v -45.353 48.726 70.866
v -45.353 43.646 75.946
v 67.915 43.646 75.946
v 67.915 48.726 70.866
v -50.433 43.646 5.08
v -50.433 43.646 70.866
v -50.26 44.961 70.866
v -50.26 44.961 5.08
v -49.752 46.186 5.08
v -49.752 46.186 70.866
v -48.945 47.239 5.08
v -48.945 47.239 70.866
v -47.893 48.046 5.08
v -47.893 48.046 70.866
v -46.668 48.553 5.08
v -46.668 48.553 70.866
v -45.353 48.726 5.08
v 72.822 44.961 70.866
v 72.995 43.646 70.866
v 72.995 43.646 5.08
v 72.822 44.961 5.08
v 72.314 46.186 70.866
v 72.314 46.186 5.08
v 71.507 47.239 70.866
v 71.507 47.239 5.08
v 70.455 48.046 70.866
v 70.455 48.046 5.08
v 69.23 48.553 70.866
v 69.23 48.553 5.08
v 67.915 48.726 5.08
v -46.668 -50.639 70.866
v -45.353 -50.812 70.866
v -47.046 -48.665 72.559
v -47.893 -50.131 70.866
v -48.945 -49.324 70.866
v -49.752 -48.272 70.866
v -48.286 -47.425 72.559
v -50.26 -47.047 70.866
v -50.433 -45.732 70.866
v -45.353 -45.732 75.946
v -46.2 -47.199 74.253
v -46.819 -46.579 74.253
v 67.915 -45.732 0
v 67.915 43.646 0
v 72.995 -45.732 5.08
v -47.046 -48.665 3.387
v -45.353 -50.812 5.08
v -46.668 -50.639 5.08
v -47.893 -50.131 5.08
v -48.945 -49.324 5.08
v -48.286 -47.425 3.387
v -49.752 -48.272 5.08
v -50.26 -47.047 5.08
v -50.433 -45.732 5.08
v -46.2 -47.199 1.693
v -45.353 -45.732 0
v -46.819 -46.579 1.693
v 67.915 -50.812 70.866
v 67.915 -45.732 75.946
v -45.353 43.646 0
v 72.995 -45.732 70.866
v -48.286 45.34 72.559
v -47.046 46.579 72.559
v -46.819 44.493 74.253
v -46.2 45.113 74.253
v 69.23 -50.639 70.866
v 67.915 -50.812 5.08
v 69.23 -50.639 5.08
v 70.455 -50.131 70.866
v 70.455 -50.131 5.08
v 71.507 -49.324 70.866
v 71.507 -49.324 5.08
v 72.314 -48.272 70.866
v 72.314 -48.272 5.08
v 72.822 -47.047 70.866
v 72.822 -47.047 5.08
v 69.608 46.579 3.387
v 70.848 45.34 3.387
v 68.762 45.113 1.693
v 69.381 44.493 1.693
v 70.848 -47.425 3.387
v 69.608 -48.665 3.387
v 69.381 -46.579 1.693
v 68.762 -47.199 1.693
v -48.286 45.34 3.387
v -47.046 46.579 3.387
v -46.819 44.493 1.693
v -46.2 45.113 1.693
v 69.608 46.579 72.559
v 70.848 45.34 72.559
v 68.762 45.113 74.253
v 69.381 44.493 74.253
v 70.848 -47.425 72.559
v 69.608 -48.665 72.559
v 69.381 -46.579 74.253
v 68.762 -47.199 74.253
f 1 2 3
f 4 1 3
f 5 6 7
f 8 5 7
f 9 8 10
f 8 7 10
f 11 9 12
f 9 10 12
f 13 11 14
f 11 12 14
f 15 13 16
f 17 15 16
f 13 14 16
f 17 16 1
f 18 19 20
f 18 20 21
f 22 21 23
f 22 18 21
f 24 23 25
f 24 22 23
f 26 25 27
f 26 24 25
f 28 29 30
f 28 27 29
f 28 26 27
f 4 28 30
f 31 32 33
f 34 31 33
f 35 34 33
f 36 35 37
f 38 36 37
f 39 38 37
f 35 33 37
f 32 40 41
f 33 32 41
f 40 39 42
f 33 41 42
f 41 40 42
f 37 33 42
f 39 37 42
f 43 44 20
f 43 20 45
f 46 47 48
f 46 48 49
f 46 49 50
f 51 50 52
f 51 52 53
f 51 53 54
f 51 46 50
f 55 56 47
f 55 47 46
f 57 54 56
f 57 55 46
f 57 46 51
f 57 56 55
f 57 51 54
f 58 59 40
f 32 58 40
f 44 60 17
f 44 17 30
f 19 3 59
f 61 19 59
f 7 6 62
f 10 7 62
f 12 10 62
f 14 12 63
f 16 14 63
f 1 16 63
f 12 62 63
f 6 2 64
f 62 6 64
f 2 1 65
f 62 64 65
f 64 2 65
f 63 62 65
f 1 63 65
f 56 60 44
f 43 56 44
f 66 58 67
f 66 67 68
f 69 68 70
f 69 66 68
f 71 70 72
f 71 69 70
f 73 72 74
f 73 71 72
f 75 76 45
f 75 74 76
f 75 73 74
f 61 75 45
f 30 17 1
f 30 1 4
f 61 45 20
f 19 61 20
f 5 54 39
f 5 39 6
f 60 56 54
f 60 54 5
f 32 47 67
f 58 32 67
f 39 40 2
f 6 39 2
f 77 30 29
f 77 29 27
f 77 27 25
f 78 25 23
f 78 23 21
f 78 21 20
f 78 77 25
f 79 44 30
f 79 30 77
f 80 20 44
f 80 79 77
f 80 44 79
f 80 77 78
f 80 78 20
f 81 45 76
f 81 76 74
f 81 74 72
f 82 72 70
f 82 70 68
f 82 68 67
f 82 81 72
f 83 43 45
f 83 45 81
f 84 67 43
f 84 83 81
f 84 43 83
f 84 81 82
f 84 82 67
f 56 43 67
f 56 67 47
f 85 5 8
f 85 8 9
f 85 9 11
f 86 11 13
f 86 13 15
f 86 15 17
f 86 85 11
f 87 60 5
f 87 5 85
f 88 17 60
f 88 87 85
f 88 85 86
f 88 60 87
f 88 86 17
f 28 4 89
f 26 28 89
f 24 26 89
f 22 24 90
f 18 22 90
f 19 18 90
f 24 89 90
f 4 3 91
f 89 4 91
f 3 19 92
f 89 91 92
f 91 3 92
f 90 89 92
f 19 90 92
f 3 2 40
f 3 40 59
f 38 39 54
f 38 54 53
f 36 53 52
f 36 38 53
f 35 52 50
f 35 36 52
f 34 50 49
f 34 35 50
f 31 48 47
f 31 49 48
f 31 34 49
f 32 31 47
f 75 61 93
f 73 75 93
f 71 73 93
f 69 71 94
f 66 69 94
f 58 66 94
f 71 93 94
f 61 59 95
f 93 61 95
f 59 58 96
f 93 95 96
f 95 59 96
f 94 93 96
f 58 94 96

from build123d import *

# Parameters (mm, degrees)
F0_W     = 123.427745
F0_H     = 99.538509
F1_DEPTH = 75.946
F2_R     = 5.08
F3_SIZE  = 5.08


with BuildPart() as f1:
    # F0 (on Top) → F1 (new body)
    with BuildSketch(Plane.XY):
        with Locations((11.28103, -1.042786)):
            Rectangle(F0_W, F0_H)
    extrude(amount=F1_DEPTH)

    # F2
    f2_edges = [f1.edges().sort_by_distance(p)[0] for p in [
        (72.994903, 48.726469, 37.973),
        (-50.432842, 48.726469, 37.973),
        (72.994903, -50.81204, 37.973),
        (-50.432842, -50.81204, 37.973),
    ]]
    fillet(f2_edges, radius=F2_R)

    # F3
    f3_edges = [f1.edges().sort_by_distance(p)[0] for p in [
        (-50.432842, -1.042785, 75.946),
        (-50.432842, -1.042785, 0),
    ]]
    chamfer(f3_edges, length=F3_SIZE)


solid = f1.part
